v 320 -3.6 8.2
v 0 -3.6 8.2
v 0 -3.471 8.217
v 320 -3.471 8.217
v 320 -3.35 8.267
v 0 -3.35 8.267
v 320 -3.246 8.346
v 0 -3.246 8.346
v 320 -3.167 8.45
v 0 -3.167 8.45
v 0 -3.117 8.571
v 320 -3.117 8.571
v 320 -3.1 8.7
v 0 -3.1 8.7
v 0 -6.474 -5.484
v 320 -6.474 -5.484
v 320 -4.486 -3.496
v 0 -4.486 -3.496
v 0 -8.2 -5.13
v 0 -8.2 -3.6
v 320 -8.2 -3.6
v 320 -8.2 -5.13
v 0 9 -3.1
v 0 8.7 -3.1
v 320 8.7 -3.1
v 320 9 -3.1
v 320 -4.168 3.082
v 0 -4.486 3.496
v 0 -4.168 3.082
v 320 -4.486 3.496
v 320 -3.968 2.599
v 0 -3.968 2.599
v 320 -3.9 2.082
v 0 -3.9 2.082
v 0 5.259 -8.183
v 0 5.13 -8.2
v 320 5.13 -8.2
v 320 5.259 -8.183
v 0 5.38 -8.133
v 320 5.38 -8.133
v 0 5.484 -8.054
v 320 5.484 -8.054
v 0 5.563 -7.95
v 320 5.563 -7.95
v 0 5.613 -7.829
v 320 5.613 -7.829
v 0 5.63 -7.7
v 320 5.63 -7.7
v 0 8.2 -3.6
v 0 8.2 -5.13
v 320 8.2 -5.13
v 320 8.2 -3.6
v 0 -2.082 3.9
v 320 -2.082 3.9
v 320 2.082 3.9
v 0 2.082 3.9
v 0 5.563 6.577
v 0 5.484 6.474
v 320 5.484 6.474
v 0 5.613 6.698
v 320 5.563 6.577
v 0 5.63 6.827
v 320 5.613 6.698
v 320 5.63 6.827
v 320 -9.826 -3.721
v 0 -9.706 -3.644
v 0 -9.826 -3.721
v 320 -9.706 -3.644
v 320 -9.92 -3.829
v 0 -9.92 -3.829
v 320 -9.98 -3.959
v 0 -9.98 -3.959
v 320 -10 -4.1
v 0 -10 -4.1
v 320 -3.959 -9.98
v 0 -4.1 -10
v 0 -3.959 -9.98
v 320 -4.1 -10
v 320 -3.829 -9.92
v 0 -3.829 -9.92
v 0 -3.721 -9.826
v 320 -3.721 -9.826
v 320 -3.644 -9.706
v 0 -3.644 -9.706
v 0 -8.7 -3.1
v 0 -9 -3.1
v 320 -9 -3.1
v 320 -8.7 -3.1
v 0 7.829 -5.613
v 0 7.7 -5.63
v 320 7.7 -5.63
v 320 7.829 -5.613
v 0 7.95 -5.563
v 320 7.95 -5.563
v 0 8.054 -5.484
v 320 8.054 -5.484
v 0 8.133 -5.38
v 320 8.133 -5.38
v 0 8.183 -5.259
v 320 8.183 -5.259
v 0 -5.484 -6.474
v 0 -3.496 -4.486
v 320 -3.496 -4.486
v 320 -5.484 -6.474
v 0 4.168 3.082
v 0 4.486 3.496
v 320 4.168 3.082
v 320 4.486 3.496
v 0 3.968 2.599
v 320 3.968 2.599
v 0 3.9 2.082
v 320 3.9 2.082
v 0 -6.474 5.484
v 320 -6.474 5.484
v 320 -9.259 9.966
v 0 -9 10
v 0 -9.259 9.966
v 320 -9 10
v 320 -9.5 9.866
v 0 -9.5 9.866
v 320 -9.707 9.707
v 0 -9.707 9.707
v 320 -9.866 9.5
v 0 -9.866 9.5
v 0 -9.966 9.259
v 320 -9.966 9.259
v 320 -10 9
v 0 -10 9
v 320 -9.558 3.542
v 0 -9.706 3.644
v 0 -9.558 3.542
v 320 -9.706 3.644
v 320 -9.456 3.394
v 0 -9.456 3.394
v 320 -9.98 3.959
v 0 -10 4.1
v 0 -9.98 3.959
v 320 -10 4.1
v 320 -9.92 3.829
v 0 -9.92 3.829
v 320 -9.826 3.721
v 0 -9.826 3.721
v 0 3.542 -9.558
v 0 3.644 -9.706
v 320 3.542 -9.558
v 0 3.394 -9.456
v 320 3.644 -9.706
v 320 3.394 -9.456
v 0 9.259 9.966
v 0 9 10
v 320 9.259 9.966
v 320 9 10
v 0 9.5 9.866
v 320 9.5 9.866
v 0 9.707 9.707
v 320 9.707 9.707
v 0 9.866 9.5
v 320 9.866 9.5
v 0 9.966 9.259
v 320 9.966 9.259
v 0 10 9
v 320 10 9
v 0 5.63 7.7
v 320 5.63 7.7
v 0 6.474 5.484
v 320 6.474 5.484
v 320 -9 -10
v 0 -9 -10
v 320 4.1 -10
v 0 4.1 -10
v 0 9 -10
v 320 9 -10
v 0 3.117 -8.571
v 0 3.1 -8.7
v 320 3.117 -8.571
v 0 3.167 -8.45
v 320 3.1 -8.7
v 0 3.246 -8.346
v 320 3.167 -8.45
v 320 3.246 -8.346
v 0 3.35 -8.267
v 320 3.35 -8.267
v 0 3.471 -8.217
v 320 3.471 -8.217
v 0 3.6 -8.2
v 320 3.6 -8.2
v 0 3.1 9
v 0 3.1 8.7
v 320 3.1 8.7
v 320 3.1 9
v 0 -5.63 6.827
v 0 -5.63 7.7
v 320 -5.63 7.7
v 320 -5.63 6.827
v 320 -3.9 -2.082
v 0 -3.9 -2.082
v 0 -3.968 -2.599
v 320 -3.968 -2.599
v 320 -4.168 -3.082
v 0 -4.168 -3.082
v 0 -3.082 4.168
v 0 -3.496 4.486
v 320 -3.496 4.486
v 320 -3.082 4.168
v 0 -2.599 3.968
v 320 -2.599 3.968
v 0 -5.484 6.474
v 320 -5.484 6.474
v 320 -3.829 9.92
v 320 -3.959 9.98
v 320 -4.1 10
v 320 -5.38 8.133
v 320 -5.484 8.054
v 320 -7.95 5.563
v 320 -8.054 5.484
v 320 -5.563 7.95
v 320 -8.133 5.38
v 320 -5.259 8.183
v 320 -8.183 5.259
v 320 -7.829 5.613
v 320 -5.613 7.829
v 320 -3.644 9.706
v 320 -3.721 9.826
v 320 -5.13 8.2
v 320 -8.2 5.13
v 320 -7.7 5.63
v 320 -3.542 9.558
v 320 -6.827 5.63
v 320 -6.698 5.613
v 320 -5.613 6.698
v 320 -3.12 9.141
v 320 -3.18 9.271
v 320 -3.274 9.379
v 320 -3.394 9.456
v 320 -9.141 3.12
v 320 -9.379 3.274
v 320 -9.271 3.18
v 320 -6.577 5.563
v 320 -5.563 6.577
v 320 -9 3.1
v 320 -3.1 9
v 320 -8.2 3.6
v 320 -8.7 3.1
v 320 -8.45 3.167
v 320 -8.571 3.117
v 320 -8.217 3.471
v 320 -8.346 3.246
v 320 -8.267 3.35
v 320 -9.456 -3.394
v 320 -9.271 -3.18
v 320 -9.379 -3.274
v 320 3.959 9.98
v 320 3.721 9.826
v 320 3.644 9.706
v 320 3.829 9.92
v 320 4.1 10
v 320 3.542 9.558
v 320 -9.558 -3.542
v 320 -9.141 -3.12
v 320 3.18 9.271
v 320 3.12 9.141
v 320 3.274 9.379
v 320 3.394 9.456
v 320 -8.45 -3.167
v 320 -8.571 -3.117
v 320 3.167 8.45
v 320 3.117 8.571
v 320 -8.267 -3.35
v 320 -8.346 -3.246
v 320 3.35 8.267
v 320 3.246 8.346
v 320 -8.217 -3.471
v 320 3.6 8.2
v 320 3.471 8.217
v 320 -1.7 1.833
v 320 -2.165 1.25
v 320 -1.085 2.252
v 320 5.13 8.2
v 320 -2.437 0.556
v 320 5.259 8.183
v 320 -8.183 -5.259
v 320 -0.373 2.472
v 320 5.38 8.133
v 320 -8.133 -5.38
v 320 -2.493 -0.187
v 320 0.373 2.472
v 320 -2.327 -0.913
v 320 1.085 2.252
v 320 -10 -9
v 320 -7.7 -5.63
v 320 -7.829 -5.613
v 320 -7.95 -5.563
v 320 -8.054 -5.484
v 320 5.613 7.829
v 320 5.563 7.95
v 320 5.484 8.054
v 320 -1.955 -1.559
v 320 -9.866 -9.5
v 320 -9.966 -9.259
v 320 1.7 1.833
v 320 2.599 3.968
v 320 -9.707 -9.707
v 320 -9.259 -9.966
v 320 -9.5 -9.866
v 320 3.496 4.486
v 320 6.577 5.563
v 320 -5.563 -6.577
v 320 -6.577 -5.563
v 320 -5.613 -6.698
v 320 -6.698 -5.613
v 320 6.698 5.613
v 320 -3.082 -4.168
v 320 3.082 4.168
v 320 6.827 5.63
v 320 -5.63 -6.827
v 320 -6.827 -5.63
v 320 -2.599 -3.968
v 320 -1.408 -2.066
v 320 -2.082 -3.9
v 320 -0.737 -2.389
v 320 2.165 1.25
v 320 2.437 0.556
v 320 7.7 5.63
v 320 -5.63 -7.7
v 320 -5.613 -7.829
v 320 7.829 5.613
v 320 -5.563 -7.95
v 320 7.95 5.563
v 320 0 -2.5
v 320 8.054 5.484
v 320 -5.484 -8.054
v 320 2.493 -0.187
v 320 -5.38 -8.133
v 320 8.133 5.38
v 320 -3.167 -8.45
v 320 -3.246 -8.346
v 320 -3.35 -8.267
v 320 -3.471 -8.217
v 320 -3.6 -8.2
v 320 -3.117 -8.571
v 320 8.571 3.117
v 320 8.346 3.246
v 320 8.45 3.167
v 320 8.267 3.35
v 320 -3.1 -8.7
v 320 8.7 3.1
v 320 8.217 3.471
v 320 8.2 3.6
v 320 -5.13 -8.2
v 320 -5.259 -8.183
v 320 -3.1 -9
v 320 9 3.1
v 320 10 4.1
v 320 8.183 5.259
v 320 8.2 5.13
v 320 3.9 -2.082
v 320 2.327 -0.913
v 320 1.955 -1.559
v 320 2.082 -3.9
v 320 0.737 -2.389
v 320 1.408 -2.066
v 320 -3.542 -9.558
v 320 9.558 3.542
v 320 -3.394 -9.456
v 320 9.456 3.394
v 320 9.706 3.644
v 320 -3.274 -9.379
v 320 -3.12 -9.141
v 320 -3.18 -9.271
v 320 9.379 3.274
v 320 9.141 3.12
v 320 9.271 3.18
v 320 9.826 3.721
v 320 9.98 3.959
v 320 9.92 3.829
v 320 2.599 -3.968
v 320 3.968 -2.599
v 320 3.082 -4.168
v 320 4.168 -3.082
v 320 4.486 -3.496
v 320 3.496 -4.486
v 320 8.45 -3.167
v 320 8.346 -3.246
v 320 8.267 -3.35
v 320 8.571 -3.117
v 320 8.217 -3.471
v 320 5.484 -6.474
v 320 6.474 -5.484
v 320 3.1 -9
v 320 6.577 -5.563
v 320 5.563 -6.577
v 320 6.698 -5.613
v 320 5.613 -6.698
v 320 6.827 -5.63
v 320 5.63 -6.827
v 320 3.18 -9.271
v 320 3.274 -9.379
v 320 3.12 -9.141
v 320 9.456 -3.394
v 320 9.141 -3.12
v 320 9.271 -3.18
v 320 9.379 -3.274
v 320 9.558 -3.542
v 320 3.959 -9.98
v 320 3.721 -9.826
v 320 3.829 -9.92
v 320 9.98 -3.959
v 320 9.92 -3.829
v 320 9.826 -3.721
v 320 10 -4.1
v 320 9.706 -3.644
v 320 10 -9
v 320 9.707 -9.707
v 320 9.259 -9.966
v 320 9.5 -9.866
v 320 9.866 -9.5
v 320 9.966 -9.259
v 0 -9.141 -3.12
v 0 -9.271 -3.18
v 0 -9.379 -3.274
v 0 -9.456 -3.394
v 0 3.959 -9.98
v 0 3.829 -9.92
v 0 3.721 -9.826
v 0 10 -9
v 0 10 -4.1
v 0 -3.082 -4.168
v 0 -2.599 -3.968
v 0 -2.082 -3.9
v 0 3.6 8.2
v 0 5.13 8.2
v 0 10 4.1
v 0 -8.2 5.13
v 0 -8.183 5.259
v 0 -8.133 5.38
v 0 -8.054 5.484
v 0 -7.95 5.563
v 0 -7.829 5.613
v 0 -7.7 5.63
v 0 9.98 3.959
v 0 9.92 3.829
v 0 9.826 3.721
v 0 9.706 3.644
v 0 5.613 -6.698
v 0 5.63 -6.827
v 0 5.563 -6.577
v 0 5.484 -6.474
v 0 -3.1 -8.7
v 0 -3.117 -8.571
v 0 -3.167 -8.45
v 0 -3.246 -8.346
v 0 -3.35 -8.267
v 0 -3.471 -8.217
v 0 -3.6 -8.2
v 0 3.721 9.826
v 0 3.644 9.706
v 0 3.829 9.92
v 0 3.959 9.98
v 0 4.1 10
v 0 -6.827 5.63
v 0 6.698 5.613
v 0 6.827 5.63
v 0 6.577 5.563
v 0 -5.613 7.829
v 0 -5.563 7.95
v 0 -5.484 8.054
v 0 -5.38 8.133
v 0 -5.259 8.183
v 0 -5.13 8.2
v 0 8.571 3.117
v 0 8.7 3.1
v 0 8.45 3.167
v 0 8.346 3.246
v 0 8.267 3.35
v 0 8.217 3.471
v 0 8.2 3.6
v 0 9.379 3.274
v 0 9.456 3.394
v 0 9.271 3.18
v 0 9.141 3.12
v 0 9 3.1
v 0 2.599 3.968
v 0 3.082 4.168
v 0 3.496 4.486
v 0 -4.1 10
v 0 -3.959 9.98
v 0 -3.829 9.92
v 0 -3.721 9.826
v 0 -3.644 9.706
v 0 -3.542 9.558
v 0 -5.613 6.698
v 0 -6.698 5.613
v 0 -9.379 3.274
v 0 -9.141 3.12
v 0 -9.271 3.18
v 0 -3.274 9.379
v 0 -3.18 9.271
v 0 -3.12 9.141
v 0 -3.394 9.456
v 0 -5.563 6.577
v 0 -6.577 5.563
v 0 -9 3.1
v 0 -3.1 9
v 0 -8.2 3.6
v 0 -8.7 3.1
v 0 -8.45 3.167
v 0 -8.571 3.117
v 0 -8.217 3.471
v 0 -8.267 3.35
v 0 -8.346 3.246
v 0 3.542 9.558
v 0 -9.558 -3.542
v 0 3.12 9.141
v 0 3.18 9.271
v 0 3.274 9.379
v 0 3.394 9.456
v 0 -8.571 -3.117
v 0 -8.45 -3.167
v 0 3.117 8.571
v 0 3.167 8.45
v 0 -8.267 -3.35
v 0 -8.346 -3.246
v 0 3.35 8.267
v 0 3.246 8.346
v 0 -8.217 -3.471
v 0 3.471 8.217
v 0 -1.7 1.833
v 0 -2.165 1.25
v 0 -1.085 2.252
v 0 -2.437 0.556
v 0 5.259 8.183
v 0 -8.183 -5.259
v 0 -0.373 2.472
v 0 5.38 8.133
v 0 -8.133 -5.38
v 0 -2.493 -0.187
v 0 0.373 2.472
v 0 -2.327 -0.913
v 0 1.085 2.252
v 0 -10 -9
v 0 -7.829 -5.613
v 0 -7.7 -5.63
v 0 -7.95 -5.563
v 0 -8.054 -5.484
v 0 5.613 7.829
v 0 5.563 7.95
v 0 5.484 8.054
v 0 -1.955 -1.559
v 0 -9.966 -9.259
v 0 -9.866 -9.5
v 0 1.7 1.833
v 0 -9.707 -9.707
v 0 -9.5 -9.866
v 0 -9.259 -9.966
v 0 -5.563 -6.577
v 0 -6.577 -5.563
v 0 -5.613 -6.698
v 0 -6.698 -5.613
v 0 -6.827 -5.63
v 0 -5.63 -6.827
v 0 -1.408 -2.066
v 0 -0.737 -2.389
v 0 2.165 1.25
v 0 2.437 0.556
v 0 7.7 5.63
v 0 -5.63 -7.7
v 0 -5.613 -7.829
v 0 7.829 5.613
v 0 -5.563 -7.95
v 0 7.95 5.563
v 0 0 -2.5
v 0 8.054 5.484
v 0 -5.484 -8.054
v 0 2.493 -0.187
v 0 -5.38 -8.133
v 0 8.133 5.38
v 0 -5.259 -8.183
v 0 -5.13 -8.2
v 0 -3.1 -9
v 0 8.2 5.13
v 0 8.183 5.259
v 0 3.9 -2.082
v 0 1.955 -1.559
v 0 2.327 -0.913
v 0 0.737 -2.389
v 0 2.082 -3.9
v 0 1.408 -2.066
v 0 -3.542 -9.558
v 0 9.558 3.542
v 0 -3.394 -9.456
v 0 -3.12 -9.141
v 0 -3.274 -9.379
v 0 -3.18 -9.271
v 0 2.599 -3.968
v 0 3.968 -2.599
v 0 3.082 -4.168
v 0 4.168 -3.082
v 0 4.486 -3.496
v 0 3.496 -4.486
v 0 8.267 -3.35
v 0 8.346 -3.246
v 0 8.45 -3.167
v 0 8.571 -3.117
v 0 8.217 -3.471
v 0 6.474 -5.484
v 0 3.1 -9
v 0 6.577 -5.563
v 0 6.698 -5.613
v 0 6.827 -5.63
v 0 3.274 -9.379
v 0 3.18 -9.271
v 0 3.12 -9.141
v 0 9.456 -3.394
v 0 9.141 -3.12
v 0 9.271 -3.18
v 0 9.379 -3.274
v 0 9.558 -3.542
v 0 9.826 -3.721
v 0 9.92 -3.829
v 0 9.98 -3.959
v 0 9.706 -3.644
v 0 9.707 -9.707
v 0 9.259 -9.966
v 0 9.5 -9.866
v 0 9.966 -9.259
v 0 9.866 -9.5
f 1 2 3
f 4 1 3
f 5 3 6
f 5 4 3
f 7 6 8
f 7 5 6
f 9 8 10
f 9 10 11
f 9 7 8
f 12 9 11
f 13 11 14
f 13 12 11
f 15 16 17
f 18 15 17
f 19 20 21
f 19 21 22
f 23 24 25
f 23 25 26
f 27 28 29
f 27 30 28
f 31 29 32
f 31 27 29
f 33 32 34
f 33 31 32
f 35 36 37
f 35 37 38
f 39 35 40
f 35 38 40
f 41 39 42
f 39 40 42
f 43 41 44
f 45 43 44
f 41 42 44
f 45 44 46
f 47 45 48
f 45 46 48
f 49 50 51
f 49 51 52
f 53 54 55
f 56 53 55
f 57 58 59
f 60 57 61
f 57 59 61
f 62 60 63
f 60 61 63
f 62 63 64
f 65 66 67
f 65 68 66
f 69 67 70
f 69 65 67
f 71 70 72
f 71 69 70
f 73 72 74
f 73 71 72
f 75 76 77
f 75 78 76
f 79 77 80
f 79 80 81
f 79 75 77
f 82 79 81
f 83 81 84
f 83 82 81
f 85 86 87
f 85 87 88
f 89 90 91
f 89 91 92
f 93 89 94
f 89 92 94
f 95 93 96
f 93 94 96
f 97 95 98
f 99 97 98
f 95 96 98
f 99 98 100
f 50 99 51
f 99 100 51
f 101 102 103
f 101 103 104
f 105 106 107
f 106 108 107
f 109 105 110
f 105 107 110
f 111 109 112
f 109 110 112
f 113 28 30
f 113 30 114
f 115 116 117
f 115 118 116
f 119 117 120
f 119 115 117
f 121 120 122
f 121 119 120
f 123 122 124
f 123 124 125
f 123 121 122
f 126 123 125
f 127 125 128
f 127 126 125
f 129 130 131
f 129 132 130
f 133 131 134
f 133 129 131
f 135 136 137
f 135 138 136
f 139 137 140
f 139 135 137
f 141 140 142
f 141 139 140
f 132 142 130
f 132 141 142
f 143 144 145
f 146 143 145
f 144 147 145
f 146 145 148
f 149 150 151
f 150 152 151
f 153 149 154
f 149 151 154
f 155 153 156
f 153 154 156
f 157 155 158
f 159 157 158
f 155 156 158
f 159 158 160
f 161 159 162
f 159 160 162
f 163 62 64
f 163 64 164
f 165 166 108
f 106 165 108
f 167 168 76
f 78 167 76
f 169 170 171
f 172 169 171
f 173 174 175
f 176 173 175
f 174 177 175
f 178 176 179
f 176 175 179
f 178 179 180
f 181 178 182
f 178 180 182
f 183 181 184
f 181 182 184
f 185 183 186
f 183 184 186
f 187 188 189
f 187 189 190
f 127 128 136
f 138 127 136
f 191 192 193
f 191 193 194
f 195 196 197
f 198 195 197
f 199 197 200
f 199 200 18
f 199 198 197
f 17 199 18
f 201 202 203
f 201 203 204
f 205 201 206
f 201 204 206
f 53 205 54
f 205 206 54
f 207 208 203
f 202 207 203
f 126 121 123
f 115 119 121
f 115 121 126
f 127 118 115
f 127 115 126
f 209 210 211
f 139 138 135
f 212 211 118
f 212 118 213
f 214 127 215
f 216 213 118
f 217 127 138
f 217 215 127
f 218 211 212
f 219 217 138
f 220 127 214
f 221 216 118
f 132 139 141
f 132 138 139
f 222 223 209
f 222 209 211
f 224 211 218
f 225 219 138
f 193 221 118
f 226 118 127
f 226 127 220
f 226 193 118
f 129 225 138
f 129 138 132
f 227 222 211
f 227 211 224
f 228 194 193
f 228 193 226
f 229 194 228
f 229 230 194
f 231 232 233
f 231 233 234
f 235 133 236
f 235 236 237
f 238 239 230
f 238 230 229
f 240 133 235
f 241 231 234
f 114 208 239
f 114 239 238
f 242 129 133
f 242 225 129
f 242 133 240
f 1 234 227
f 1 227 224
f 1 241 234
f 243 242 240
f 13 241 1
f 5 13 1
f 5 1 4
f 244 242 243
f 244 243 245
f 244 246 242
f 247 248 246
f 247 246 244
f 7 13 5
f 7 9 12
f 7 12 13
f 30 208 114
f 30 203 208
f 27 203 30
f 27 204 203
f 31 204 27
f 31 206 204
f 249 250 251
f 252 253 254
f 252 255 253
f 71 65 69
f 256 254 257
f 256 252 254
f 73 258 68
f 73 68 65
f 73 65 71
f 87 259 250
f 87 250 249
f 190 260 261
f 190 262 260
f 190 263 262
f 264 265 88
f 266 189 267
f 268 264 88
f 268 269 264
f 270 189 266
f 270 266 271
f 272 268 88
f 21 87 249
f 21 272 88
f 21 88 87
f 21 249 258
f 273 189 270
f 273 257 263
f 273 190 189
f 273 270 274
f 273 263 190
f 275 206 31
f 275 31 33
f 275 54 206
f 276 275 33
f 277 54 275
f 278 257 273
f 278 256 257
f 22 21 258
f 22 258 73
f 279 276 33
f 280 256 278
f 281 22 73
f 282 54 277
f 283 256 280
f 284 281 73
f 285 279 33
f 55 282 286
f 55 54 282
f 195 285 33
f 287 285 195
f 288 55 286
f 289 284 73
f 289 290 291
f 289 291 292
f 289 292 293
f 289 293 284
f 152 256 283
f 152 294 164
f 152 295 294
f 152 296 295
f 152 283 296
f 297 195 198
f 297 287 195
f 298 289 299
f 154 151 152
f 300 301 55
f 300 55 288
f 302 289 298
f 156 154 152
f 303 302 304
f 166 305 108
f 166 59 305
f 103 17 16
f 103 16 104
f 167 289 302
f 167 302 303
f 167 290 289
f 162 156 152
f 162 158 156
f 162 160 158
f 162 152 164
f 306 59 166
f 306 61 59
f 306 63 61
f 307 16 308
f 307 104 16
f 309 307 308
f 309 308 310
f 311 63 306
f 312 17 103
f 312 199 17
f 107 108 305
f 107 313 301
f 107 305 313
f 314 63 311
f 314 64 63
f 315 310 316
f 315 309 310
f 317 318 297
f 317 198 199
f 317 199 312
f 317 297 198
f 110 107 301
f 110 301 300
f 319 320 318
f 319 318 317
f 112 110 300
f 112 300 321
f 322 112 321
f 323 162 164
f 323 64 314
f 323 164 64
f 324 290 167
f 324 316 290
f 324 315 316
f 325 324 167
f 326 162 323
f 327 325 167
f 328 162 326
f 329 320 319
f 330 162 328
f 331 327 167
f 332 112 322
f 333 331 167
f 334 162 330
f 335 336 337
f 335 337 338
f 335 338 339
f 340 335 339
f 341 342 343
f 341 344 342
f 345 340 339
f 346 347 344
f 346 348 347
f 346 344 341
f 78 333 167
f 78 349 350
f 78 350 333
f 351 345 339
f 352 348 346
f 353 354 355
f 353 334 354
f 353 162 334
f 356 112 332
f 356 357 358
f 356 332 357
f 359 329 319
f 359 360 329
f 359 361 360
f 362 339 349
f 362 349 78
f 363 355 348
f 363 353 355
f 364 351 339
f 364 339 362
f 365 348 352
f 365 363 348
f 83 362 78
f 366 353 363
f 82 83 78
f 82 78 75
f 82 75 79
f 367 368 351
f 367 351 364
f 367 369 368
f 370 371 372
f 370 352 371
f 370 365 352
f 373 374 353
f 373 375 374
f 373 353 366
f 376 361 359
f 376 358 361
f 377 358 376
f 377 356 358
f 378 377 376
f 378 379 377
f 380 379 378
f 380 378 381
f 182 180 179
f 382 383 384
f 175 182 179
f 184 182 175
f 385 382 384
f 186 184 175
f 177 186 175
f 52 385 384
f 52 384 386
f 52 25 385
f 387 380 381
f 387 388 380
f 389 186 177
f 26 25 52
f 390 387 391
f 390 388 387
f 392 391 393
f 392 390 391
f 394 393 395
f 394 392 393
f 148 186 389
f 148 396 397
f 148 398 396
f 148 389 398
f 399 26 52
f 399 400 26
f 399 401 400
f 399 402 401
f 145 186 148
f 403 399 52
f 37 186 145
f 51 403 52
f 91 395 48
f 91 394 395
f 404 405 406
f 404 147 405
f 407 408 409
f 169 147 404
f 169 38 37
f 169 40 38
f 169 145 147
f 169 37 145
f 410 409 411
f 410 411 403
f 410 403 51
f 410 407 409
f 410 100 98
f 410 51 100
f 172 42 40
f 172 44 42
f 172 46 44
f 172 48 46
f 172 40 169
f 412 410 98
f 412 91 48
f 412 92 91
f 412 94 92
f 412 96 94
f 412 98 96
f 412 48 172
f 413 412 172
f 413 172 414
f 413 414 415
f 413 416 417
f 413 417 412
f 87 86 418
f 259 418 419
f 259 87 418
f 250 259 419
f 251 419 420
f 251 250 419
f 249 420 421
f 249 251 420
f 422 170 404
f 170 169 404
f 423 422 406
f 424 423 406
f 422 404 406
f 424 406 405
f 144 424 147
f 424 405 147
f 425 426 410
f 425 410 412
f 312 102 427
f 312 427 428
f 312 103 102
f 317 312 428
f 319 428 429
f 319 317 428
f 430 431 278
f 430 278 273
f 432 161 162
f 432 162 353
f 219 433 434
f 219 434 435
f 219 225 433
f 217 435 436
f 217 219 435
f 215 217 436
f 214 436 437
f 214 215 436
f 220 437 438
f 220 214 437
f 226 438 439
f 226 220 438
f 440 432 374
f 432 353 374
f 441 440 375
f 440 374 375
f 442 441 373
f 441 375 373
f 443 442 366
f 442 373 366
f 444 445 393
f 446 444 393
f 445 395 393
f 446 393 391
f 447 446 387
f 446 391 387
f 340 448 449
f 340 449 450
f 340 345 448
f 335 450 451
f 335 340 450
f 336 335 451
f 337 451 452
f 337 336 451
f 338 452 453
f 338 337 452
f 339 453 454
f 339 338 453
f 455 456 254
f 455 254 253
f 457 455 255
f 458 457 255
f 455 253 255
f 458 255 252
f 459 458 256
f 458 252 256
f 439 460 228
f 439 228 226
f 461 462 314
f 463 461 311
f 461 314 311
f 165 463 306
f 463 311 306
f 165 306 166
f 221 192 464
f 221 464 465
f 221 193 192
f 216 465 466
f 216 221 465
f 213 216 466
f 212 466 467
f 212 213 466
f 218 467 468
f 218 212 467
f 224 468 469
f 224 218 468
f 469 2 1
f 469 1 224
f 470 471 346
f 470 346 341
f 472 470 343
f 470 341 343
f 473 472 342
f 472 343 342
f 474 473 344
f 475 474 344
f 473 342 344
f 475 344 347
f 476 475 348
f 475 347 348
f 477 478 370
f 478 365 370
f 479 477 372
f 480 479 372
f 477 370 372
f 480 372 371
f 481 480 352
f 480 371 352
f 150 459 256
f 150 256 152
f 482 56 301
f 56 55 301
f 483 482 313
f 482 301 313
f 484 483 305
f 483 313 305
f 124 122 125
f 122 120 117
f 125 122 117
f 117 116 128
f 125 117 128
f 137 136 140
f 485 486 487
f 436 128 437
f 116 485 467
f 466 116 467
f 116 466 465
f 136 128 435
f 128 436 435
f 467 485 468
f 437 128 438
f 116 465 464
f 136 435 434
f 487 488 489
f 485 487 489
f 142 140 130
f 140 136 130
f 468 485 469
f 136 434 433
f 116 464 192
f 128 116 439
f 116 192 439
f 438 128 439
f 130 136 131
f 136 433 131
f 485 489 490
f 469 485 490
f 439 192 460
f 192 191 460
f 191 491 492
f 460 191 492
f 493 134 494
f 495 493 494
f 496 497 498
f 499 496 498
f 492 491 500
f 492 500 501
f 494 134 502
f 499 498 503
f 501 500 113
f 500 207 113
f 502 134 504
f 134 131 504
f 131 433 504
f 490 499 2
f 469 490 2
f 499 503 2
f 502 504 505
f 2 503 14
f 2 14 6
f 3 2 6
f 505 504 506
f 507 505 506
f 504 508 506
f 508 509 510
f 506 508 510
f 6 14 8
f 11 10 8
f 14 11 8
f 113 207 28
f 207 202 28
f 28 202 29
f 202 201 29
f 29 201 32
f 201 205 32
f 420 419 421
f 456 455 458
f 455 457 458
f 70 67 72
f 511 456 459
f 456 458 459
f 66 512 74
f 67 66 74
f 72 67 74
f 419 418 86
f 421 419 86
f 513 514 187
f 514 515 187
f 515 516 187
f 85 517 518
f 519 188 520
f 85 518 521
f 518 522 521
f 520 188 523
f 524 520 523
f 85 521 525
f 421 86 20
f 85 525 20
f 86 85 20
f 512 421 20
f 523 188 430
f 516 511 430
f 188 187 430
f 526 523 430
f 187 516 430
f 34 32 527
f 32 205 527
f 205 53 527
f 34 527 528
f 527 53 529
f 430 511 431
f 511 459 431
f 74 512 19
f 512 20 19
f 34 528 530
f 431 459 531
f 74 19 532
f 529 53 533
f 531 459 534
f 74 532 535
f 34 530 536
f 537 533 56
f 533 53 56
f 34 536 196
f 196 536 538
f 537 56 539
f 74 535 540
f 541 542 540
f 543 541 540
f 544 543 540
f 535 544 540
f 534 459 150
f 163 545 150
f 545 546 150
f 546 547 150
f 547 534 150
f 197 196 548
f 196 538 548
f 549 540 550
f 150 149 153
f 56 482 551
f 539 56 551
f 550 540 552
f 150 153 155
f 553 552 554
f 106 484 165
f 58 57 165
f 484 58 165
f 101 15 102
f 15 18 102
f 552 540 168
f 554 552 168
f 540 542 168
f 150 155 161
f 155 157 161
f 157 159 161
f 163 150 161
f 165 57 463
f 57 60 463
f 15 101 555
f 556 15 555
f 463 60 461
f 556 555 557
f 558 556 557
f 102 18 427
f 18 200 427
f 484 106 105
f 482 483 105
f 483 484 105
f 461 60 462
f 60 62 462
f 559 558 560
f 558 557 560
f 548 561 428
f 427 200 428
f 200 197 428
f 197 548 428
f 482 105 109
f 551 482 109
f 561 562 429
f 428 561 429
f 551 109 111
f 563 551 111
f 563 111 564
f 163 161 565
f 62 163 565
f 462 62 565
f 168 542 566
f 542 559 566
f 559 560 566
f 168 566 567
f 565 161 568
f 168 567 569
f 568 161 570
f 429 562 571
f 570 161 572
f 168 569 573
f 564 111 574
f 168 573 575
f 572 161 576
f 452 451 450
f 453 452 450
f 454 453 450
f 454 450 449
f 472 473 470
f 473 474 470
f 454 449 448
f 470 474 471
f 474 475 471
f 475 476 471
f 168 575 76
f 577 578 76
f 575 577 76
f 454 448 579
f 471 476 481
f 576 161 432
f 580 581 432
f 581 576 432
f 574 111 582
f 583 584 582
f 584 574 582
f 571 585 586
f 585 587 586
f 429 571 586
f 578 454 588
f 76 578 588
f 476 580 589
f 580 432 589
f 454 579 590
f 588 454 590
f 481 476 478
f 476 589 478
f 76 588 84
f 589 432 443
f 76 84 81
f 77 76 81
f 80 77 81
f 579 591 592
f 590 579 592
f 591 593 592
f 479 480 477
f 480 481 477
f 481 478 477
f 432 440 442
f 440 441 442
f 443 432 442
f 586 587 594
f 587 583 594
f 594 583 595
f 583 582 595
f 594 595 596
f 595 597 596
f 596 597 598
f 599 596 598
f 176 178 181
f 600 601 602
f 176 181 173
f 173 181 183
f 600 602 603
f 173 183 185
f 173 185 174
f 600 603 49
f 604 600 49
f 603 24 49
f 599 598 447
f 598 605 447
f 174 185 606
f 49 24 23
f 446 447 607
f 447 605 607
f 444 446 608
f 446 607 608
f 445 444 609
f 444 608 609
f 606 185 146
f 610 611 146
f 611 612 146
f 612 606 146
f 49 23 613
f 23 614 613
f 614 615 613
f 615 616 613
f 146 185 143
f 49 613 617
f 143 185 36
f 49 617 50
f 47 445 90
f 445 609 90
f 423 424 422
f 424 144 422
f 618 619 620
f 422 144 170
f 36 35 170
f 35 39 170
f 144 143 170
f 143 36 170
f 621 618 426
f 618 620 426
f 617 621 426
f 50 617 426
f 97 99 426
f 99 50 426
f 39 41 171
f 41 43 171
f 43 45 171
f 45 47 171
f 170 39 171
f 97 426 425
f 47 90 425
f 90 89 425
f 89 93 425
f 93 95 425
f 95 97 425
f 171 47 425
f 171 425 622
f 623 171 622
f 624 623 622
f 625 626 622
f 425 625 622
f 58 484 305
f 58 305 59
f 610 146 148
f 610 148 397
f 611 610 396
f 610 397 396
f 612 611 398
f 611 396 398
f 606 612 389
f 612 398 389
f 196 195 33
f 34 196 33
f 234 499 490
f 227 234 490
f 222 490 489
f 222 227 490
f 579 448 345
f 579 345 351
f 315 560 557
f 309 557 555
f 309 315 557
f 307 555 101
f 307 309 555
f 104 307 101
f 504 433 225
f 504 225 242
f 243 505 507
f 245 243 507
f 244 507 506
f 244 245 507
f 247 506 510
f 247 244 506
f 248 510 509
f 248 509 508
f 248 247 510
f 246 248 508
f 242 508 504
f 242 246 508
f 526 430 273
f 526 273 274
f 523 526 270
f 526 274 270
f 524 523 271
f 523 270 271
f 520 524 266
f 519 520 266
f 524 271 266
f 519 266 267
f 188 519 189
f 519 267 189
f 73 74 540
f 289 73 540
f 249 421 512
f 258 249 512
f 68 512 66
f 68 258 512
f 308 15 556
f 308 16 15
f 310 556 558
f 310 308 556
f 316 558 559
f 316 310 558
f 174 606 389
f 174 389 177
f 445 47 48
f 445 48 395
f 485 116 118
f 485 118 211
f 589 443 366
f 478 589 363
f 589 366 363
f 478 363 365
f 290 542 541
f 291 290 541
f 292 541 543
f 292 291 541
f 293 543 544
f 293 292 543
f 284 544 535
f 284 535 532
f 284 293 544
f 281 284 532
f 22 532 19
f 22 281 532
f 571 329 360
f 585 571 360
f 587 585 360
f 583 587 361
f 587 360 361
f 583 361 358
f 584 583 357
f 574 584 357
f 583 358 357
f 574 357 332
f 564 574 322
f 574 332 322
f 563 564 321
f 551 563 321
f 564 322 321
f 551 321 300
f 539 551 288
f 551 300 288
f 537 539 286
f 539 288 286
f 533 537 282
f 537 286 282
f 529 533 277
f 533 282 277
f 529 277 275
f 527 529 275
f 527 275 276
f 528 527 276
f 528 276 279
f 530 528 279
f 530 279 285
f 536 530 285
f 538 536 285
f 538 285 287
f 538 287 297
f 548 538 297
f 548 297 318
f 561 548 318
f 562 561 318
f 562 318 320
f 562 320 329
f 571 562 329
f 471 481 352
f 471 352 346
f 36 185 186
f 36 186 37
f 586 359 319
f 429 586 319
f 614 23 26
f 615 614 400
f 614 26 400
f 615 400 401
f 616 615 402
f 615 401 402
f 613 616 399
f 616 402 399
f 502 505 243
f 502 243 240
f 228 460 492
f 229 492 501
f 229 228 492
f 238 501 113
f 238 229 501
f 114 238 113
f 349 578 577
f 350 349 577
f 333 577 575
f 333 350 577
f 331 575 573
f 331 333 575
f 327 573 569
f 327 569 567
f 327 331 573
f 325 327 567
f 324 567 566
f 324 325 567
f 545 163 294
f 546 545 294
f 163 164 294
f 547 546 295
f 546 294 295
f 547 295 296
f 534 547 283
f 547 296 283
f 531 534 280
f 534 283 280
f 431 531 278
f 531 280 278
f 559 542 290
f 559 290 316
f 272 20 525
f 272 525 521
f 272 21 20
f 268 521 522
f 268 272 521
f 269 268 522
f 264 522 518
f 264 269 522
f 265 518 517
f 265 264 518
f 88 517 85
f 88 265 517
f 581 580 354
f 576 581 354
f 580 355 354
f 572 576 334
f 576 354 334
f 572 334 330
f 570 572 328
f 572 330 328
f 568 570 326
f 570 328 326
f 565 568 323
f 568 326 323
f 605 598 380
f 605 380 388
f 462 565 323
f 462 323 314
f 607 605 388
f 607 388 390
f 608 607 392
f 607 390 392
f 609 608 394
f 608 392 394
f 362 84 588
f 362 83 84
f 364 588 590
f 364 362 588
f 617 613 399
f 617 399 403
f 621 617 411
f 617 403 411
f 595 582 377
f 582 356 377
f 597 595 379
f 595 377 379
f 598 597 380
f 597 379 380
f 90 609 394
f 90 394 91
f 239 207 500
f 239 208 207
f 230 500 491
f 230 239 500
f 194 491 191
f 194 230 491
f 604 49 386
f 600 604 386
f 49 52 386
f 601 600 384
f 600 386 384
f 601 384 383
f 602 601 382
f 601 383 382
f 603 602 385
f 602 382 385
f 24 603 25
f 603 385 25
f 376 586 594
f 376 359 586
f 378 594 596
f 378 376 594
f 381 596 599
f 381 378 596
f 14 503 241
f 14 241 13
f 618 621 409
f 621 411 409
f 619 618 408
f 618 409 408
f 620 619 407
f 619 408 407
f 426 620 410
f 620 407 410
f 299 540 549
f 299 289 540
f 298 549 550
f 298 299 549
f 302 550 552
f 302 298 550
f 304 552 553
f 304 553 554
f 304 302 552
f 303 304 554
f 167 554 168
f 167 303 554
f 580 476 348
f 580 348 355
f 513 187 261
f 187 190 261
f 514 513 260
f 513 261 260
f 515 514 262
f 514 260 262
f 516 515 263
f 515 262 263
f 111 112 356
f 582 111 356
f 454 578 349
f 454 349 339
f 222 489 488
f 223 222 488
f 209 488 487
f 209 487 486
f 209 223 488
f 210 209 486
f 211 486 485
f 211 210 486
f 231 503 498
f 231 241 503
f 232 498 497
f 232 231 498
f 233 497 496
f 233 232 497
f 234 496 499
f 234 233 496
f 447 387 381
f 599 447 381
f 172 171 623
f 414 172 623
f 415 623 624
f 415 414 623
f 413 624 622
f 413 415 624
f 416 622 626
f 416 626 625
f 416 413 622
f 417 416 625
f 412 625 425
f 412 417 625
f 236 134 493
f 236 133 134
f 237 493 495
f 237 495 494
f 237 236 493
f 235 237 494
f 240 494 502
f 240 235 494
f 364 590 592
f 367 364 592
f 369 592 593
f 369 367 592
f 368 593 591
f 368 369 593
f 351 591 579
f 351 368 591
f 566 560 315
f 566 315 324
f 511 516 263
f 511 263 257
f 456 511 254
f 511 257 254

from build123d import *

# Parameters (mm, degrees)
SKETCH1_W                = 20
SKETCH1_H                = 20
BOSS_EXTRUDE1_DEPTH      = 320
FILLET1_R                = 1
CUT_EXTRUDE1_DEPTH       = 321.312347561
F_5_0_5_DIAMETER_HOLE1_D = 5
FILLET2_R                = 2
FILLET3_R                = 0.5
FILLET4_R                = 0.5
FILLET5_R                = 0.5


with BuildPart() as part:
    # Sketch1 → Boss-Extrude1 (new body)
    with BuildSketch(Plane(origin=(0, 0, 0), x_dir=(0, 0, -1), z_dir=(1, 0, 0))):
        Rectangle(SKETCH1_W, SKETCH1_H)
    extrude(amount=BOSS_EXTRUDE1_DEPTH)

    # Fillet1
    fillet1_edges = [part.edges().sort_by_distance(p)[0] for p in [
        (160, 10, 10),
        (160, 10, -10),
        (160, -10, -10),
        (160, -10, 10),
    ]]
    fillet(fillet1_edges, radius=FILLET1_R)

    # Sketch3 → Cut-Extrude1 (cut, through all)
    with BuildSketch(Plane.ZY):
        Polygon((-3.6, 10), (3.6, 10), (3.6, 9.5), (3.1, 9.5), (3.1, 8.2), (5.63, 8.2), (5.63, 6.619949494), (2.910050506, 3.9), (-2.910050506, 3.9), (-5.63, 6.619949494), (-5.63, 8.2), (-3.1, 8.2), (-3.1, 9.5), (-3.6, 9.5), align=None)
        Polygon((10, 3.6), (10, -3.6), (9.5, -3.6), (9.5, -3.1), (8.2, -3.1), (8.2, -5.63), (6.619949494, -5.63), (3.9, -2.910050506), (3.9, 2.910050506), (6.619949494, 5.63), (8.2, 5.63), (8.2, 3.1), (9.5, 3.1), (9.5, 3.6), align=None)
        Polygon((3.6, -10), (-3.6, -10), (-3.6, -9.5), (-3.1, -9.5), (-3.1, -8.2), (-5.63, -8.2), (-5.63, -6.619949494), (-2.910050506, -3.9), (2.910050506, -3.9), (5.63, -6.619949494), (5.63, -8.2), (3.1, -8.2), (3.1, -9.5), (3.6, -9.5), align=None)
        Polygon((-10, -3.6), (-10, 3.6), (-9.5, 3.6), (-9.5, 3.1), (-8.2, 3.1), (-8.2, 5.63), (-6.619949494, 5.63), (-3.9, 2.910050506), (-3.9, -2.910050506), (-6.619949494, -5.63), (-8.2, -5.63), (-8.2, -3.1), (-9.5, -3.1), (-9.5, -3.6), align=None)
    extrude(amount=-CUT_EXTRUDE1_DEPTH, mode=Mode.SUBTRACT)

    # Ø5.0 (5) Diameter Hole1 (through all)
    with Locations(Plane.ZY):
        with Locations((0, 0)):
            Hole(F_5_0_5_DIAMETER_HOLE1_D / 2)

    # Fillet2
    fillet2_edges = [part.edges().sort_by_distance(p)[0] for p in [
        (160, -3.9, -2.910050506),
        (160, -3.9, 2.910050506),
        (160, 2.910050506, -3.9),
        (160, -2.910050506, -3.9),
        (160, -2.910050506, 3.9),
        (160, 2.910050506, 3.9),
        (160, 3.9, 2.910050506),
        (160, 3.9, -2.910050506),
    ]]
    fillet(fillet2_edges, radius=FILLET2_R)

    # Fillet3
    fillet3_edges = [part.edges().sort_by_distance(p)[0] for p in [
        (160, 3.6, -10),
        (160, 3.1, -9.5),
        (160, 3.1, -8.2),
        (160, 5.63, -8.2),
        (160, 5.63, -6.619949494),
        (160, 3.6, 10),
        (160, 3.1, 9.5),
        (160, 3.1, 8.2),
        (160, 5.63, 8.2),
        (160, 5.63, 6.619949494),
        (160, 6.619949494, 5.63),
        (160, 8.2, 5.63),
        (160, 8.2, 3.1),
        (160, 9.5, 3.1),
        (160, 10, 3.6),
        (160, 9.5, -3.1),
        (160, 10, -3.6),
        (160, 8.2, -3.1),
        (160, 8.2, -5.63),
        (160, 6.619949494, -5.63),
    ]]
    fillet(fillet3_edges, radius=FILLET3_R - 0.0001)  # a hair under: the kernel refuses the full size

    # Fillet4
    fillet4_edges = [part.edges().sort_by_distance(p)[0] for p in [
        (160, -3.6, 10),
        (160, -3.1, 9.5),
        (160, -3.1, 8.2),
        (160, -5.63, 8.2),
        (160, -5.63, 6.619949494),
        (160, -6.619949494, 5.63),
        (160, -8.2, 5.63),
        (160, -8.2, 3.1),
        (160, -10, 3.6),
        (160, -9.5, 3.1),
        (160, -10, -3.6),
        (160, -9.5, -3.1),
        (160, -8.2, -3.1),
        (160, -8.2, -5.63),
        (160, -6.619949494, -5.63),
        (160, -5.63, -6.619949494),
        (160, -5.63, -8.2),
        (160, -3.1, -8.2),
        (160, -3.1, -9.5),
        (160, -3.6, -10),
    ]]
    fillet(fillet4_edges, radius=FILLET4_R - 0.0001)  # a hair under: the kernel refuses the full size

    # Fillet5
    fillet5_edges = [part.edges().sort_by_distance(p)[0] for p in [
        (160, 3.6, 9.5),
        (160, 9.5, 3.6),
        (160, 9.5, -3.6),
        (160, 3.6, -9.5),
        (160, -3.6, 9.5),
        (160, -9.5, 3.6),
        (160, -9.5, -3.6),
        (160, -3.6, -9.5),
    ]]
    fillet(fillet5_edges, radius=FILLET5_R)


solid = part.part
